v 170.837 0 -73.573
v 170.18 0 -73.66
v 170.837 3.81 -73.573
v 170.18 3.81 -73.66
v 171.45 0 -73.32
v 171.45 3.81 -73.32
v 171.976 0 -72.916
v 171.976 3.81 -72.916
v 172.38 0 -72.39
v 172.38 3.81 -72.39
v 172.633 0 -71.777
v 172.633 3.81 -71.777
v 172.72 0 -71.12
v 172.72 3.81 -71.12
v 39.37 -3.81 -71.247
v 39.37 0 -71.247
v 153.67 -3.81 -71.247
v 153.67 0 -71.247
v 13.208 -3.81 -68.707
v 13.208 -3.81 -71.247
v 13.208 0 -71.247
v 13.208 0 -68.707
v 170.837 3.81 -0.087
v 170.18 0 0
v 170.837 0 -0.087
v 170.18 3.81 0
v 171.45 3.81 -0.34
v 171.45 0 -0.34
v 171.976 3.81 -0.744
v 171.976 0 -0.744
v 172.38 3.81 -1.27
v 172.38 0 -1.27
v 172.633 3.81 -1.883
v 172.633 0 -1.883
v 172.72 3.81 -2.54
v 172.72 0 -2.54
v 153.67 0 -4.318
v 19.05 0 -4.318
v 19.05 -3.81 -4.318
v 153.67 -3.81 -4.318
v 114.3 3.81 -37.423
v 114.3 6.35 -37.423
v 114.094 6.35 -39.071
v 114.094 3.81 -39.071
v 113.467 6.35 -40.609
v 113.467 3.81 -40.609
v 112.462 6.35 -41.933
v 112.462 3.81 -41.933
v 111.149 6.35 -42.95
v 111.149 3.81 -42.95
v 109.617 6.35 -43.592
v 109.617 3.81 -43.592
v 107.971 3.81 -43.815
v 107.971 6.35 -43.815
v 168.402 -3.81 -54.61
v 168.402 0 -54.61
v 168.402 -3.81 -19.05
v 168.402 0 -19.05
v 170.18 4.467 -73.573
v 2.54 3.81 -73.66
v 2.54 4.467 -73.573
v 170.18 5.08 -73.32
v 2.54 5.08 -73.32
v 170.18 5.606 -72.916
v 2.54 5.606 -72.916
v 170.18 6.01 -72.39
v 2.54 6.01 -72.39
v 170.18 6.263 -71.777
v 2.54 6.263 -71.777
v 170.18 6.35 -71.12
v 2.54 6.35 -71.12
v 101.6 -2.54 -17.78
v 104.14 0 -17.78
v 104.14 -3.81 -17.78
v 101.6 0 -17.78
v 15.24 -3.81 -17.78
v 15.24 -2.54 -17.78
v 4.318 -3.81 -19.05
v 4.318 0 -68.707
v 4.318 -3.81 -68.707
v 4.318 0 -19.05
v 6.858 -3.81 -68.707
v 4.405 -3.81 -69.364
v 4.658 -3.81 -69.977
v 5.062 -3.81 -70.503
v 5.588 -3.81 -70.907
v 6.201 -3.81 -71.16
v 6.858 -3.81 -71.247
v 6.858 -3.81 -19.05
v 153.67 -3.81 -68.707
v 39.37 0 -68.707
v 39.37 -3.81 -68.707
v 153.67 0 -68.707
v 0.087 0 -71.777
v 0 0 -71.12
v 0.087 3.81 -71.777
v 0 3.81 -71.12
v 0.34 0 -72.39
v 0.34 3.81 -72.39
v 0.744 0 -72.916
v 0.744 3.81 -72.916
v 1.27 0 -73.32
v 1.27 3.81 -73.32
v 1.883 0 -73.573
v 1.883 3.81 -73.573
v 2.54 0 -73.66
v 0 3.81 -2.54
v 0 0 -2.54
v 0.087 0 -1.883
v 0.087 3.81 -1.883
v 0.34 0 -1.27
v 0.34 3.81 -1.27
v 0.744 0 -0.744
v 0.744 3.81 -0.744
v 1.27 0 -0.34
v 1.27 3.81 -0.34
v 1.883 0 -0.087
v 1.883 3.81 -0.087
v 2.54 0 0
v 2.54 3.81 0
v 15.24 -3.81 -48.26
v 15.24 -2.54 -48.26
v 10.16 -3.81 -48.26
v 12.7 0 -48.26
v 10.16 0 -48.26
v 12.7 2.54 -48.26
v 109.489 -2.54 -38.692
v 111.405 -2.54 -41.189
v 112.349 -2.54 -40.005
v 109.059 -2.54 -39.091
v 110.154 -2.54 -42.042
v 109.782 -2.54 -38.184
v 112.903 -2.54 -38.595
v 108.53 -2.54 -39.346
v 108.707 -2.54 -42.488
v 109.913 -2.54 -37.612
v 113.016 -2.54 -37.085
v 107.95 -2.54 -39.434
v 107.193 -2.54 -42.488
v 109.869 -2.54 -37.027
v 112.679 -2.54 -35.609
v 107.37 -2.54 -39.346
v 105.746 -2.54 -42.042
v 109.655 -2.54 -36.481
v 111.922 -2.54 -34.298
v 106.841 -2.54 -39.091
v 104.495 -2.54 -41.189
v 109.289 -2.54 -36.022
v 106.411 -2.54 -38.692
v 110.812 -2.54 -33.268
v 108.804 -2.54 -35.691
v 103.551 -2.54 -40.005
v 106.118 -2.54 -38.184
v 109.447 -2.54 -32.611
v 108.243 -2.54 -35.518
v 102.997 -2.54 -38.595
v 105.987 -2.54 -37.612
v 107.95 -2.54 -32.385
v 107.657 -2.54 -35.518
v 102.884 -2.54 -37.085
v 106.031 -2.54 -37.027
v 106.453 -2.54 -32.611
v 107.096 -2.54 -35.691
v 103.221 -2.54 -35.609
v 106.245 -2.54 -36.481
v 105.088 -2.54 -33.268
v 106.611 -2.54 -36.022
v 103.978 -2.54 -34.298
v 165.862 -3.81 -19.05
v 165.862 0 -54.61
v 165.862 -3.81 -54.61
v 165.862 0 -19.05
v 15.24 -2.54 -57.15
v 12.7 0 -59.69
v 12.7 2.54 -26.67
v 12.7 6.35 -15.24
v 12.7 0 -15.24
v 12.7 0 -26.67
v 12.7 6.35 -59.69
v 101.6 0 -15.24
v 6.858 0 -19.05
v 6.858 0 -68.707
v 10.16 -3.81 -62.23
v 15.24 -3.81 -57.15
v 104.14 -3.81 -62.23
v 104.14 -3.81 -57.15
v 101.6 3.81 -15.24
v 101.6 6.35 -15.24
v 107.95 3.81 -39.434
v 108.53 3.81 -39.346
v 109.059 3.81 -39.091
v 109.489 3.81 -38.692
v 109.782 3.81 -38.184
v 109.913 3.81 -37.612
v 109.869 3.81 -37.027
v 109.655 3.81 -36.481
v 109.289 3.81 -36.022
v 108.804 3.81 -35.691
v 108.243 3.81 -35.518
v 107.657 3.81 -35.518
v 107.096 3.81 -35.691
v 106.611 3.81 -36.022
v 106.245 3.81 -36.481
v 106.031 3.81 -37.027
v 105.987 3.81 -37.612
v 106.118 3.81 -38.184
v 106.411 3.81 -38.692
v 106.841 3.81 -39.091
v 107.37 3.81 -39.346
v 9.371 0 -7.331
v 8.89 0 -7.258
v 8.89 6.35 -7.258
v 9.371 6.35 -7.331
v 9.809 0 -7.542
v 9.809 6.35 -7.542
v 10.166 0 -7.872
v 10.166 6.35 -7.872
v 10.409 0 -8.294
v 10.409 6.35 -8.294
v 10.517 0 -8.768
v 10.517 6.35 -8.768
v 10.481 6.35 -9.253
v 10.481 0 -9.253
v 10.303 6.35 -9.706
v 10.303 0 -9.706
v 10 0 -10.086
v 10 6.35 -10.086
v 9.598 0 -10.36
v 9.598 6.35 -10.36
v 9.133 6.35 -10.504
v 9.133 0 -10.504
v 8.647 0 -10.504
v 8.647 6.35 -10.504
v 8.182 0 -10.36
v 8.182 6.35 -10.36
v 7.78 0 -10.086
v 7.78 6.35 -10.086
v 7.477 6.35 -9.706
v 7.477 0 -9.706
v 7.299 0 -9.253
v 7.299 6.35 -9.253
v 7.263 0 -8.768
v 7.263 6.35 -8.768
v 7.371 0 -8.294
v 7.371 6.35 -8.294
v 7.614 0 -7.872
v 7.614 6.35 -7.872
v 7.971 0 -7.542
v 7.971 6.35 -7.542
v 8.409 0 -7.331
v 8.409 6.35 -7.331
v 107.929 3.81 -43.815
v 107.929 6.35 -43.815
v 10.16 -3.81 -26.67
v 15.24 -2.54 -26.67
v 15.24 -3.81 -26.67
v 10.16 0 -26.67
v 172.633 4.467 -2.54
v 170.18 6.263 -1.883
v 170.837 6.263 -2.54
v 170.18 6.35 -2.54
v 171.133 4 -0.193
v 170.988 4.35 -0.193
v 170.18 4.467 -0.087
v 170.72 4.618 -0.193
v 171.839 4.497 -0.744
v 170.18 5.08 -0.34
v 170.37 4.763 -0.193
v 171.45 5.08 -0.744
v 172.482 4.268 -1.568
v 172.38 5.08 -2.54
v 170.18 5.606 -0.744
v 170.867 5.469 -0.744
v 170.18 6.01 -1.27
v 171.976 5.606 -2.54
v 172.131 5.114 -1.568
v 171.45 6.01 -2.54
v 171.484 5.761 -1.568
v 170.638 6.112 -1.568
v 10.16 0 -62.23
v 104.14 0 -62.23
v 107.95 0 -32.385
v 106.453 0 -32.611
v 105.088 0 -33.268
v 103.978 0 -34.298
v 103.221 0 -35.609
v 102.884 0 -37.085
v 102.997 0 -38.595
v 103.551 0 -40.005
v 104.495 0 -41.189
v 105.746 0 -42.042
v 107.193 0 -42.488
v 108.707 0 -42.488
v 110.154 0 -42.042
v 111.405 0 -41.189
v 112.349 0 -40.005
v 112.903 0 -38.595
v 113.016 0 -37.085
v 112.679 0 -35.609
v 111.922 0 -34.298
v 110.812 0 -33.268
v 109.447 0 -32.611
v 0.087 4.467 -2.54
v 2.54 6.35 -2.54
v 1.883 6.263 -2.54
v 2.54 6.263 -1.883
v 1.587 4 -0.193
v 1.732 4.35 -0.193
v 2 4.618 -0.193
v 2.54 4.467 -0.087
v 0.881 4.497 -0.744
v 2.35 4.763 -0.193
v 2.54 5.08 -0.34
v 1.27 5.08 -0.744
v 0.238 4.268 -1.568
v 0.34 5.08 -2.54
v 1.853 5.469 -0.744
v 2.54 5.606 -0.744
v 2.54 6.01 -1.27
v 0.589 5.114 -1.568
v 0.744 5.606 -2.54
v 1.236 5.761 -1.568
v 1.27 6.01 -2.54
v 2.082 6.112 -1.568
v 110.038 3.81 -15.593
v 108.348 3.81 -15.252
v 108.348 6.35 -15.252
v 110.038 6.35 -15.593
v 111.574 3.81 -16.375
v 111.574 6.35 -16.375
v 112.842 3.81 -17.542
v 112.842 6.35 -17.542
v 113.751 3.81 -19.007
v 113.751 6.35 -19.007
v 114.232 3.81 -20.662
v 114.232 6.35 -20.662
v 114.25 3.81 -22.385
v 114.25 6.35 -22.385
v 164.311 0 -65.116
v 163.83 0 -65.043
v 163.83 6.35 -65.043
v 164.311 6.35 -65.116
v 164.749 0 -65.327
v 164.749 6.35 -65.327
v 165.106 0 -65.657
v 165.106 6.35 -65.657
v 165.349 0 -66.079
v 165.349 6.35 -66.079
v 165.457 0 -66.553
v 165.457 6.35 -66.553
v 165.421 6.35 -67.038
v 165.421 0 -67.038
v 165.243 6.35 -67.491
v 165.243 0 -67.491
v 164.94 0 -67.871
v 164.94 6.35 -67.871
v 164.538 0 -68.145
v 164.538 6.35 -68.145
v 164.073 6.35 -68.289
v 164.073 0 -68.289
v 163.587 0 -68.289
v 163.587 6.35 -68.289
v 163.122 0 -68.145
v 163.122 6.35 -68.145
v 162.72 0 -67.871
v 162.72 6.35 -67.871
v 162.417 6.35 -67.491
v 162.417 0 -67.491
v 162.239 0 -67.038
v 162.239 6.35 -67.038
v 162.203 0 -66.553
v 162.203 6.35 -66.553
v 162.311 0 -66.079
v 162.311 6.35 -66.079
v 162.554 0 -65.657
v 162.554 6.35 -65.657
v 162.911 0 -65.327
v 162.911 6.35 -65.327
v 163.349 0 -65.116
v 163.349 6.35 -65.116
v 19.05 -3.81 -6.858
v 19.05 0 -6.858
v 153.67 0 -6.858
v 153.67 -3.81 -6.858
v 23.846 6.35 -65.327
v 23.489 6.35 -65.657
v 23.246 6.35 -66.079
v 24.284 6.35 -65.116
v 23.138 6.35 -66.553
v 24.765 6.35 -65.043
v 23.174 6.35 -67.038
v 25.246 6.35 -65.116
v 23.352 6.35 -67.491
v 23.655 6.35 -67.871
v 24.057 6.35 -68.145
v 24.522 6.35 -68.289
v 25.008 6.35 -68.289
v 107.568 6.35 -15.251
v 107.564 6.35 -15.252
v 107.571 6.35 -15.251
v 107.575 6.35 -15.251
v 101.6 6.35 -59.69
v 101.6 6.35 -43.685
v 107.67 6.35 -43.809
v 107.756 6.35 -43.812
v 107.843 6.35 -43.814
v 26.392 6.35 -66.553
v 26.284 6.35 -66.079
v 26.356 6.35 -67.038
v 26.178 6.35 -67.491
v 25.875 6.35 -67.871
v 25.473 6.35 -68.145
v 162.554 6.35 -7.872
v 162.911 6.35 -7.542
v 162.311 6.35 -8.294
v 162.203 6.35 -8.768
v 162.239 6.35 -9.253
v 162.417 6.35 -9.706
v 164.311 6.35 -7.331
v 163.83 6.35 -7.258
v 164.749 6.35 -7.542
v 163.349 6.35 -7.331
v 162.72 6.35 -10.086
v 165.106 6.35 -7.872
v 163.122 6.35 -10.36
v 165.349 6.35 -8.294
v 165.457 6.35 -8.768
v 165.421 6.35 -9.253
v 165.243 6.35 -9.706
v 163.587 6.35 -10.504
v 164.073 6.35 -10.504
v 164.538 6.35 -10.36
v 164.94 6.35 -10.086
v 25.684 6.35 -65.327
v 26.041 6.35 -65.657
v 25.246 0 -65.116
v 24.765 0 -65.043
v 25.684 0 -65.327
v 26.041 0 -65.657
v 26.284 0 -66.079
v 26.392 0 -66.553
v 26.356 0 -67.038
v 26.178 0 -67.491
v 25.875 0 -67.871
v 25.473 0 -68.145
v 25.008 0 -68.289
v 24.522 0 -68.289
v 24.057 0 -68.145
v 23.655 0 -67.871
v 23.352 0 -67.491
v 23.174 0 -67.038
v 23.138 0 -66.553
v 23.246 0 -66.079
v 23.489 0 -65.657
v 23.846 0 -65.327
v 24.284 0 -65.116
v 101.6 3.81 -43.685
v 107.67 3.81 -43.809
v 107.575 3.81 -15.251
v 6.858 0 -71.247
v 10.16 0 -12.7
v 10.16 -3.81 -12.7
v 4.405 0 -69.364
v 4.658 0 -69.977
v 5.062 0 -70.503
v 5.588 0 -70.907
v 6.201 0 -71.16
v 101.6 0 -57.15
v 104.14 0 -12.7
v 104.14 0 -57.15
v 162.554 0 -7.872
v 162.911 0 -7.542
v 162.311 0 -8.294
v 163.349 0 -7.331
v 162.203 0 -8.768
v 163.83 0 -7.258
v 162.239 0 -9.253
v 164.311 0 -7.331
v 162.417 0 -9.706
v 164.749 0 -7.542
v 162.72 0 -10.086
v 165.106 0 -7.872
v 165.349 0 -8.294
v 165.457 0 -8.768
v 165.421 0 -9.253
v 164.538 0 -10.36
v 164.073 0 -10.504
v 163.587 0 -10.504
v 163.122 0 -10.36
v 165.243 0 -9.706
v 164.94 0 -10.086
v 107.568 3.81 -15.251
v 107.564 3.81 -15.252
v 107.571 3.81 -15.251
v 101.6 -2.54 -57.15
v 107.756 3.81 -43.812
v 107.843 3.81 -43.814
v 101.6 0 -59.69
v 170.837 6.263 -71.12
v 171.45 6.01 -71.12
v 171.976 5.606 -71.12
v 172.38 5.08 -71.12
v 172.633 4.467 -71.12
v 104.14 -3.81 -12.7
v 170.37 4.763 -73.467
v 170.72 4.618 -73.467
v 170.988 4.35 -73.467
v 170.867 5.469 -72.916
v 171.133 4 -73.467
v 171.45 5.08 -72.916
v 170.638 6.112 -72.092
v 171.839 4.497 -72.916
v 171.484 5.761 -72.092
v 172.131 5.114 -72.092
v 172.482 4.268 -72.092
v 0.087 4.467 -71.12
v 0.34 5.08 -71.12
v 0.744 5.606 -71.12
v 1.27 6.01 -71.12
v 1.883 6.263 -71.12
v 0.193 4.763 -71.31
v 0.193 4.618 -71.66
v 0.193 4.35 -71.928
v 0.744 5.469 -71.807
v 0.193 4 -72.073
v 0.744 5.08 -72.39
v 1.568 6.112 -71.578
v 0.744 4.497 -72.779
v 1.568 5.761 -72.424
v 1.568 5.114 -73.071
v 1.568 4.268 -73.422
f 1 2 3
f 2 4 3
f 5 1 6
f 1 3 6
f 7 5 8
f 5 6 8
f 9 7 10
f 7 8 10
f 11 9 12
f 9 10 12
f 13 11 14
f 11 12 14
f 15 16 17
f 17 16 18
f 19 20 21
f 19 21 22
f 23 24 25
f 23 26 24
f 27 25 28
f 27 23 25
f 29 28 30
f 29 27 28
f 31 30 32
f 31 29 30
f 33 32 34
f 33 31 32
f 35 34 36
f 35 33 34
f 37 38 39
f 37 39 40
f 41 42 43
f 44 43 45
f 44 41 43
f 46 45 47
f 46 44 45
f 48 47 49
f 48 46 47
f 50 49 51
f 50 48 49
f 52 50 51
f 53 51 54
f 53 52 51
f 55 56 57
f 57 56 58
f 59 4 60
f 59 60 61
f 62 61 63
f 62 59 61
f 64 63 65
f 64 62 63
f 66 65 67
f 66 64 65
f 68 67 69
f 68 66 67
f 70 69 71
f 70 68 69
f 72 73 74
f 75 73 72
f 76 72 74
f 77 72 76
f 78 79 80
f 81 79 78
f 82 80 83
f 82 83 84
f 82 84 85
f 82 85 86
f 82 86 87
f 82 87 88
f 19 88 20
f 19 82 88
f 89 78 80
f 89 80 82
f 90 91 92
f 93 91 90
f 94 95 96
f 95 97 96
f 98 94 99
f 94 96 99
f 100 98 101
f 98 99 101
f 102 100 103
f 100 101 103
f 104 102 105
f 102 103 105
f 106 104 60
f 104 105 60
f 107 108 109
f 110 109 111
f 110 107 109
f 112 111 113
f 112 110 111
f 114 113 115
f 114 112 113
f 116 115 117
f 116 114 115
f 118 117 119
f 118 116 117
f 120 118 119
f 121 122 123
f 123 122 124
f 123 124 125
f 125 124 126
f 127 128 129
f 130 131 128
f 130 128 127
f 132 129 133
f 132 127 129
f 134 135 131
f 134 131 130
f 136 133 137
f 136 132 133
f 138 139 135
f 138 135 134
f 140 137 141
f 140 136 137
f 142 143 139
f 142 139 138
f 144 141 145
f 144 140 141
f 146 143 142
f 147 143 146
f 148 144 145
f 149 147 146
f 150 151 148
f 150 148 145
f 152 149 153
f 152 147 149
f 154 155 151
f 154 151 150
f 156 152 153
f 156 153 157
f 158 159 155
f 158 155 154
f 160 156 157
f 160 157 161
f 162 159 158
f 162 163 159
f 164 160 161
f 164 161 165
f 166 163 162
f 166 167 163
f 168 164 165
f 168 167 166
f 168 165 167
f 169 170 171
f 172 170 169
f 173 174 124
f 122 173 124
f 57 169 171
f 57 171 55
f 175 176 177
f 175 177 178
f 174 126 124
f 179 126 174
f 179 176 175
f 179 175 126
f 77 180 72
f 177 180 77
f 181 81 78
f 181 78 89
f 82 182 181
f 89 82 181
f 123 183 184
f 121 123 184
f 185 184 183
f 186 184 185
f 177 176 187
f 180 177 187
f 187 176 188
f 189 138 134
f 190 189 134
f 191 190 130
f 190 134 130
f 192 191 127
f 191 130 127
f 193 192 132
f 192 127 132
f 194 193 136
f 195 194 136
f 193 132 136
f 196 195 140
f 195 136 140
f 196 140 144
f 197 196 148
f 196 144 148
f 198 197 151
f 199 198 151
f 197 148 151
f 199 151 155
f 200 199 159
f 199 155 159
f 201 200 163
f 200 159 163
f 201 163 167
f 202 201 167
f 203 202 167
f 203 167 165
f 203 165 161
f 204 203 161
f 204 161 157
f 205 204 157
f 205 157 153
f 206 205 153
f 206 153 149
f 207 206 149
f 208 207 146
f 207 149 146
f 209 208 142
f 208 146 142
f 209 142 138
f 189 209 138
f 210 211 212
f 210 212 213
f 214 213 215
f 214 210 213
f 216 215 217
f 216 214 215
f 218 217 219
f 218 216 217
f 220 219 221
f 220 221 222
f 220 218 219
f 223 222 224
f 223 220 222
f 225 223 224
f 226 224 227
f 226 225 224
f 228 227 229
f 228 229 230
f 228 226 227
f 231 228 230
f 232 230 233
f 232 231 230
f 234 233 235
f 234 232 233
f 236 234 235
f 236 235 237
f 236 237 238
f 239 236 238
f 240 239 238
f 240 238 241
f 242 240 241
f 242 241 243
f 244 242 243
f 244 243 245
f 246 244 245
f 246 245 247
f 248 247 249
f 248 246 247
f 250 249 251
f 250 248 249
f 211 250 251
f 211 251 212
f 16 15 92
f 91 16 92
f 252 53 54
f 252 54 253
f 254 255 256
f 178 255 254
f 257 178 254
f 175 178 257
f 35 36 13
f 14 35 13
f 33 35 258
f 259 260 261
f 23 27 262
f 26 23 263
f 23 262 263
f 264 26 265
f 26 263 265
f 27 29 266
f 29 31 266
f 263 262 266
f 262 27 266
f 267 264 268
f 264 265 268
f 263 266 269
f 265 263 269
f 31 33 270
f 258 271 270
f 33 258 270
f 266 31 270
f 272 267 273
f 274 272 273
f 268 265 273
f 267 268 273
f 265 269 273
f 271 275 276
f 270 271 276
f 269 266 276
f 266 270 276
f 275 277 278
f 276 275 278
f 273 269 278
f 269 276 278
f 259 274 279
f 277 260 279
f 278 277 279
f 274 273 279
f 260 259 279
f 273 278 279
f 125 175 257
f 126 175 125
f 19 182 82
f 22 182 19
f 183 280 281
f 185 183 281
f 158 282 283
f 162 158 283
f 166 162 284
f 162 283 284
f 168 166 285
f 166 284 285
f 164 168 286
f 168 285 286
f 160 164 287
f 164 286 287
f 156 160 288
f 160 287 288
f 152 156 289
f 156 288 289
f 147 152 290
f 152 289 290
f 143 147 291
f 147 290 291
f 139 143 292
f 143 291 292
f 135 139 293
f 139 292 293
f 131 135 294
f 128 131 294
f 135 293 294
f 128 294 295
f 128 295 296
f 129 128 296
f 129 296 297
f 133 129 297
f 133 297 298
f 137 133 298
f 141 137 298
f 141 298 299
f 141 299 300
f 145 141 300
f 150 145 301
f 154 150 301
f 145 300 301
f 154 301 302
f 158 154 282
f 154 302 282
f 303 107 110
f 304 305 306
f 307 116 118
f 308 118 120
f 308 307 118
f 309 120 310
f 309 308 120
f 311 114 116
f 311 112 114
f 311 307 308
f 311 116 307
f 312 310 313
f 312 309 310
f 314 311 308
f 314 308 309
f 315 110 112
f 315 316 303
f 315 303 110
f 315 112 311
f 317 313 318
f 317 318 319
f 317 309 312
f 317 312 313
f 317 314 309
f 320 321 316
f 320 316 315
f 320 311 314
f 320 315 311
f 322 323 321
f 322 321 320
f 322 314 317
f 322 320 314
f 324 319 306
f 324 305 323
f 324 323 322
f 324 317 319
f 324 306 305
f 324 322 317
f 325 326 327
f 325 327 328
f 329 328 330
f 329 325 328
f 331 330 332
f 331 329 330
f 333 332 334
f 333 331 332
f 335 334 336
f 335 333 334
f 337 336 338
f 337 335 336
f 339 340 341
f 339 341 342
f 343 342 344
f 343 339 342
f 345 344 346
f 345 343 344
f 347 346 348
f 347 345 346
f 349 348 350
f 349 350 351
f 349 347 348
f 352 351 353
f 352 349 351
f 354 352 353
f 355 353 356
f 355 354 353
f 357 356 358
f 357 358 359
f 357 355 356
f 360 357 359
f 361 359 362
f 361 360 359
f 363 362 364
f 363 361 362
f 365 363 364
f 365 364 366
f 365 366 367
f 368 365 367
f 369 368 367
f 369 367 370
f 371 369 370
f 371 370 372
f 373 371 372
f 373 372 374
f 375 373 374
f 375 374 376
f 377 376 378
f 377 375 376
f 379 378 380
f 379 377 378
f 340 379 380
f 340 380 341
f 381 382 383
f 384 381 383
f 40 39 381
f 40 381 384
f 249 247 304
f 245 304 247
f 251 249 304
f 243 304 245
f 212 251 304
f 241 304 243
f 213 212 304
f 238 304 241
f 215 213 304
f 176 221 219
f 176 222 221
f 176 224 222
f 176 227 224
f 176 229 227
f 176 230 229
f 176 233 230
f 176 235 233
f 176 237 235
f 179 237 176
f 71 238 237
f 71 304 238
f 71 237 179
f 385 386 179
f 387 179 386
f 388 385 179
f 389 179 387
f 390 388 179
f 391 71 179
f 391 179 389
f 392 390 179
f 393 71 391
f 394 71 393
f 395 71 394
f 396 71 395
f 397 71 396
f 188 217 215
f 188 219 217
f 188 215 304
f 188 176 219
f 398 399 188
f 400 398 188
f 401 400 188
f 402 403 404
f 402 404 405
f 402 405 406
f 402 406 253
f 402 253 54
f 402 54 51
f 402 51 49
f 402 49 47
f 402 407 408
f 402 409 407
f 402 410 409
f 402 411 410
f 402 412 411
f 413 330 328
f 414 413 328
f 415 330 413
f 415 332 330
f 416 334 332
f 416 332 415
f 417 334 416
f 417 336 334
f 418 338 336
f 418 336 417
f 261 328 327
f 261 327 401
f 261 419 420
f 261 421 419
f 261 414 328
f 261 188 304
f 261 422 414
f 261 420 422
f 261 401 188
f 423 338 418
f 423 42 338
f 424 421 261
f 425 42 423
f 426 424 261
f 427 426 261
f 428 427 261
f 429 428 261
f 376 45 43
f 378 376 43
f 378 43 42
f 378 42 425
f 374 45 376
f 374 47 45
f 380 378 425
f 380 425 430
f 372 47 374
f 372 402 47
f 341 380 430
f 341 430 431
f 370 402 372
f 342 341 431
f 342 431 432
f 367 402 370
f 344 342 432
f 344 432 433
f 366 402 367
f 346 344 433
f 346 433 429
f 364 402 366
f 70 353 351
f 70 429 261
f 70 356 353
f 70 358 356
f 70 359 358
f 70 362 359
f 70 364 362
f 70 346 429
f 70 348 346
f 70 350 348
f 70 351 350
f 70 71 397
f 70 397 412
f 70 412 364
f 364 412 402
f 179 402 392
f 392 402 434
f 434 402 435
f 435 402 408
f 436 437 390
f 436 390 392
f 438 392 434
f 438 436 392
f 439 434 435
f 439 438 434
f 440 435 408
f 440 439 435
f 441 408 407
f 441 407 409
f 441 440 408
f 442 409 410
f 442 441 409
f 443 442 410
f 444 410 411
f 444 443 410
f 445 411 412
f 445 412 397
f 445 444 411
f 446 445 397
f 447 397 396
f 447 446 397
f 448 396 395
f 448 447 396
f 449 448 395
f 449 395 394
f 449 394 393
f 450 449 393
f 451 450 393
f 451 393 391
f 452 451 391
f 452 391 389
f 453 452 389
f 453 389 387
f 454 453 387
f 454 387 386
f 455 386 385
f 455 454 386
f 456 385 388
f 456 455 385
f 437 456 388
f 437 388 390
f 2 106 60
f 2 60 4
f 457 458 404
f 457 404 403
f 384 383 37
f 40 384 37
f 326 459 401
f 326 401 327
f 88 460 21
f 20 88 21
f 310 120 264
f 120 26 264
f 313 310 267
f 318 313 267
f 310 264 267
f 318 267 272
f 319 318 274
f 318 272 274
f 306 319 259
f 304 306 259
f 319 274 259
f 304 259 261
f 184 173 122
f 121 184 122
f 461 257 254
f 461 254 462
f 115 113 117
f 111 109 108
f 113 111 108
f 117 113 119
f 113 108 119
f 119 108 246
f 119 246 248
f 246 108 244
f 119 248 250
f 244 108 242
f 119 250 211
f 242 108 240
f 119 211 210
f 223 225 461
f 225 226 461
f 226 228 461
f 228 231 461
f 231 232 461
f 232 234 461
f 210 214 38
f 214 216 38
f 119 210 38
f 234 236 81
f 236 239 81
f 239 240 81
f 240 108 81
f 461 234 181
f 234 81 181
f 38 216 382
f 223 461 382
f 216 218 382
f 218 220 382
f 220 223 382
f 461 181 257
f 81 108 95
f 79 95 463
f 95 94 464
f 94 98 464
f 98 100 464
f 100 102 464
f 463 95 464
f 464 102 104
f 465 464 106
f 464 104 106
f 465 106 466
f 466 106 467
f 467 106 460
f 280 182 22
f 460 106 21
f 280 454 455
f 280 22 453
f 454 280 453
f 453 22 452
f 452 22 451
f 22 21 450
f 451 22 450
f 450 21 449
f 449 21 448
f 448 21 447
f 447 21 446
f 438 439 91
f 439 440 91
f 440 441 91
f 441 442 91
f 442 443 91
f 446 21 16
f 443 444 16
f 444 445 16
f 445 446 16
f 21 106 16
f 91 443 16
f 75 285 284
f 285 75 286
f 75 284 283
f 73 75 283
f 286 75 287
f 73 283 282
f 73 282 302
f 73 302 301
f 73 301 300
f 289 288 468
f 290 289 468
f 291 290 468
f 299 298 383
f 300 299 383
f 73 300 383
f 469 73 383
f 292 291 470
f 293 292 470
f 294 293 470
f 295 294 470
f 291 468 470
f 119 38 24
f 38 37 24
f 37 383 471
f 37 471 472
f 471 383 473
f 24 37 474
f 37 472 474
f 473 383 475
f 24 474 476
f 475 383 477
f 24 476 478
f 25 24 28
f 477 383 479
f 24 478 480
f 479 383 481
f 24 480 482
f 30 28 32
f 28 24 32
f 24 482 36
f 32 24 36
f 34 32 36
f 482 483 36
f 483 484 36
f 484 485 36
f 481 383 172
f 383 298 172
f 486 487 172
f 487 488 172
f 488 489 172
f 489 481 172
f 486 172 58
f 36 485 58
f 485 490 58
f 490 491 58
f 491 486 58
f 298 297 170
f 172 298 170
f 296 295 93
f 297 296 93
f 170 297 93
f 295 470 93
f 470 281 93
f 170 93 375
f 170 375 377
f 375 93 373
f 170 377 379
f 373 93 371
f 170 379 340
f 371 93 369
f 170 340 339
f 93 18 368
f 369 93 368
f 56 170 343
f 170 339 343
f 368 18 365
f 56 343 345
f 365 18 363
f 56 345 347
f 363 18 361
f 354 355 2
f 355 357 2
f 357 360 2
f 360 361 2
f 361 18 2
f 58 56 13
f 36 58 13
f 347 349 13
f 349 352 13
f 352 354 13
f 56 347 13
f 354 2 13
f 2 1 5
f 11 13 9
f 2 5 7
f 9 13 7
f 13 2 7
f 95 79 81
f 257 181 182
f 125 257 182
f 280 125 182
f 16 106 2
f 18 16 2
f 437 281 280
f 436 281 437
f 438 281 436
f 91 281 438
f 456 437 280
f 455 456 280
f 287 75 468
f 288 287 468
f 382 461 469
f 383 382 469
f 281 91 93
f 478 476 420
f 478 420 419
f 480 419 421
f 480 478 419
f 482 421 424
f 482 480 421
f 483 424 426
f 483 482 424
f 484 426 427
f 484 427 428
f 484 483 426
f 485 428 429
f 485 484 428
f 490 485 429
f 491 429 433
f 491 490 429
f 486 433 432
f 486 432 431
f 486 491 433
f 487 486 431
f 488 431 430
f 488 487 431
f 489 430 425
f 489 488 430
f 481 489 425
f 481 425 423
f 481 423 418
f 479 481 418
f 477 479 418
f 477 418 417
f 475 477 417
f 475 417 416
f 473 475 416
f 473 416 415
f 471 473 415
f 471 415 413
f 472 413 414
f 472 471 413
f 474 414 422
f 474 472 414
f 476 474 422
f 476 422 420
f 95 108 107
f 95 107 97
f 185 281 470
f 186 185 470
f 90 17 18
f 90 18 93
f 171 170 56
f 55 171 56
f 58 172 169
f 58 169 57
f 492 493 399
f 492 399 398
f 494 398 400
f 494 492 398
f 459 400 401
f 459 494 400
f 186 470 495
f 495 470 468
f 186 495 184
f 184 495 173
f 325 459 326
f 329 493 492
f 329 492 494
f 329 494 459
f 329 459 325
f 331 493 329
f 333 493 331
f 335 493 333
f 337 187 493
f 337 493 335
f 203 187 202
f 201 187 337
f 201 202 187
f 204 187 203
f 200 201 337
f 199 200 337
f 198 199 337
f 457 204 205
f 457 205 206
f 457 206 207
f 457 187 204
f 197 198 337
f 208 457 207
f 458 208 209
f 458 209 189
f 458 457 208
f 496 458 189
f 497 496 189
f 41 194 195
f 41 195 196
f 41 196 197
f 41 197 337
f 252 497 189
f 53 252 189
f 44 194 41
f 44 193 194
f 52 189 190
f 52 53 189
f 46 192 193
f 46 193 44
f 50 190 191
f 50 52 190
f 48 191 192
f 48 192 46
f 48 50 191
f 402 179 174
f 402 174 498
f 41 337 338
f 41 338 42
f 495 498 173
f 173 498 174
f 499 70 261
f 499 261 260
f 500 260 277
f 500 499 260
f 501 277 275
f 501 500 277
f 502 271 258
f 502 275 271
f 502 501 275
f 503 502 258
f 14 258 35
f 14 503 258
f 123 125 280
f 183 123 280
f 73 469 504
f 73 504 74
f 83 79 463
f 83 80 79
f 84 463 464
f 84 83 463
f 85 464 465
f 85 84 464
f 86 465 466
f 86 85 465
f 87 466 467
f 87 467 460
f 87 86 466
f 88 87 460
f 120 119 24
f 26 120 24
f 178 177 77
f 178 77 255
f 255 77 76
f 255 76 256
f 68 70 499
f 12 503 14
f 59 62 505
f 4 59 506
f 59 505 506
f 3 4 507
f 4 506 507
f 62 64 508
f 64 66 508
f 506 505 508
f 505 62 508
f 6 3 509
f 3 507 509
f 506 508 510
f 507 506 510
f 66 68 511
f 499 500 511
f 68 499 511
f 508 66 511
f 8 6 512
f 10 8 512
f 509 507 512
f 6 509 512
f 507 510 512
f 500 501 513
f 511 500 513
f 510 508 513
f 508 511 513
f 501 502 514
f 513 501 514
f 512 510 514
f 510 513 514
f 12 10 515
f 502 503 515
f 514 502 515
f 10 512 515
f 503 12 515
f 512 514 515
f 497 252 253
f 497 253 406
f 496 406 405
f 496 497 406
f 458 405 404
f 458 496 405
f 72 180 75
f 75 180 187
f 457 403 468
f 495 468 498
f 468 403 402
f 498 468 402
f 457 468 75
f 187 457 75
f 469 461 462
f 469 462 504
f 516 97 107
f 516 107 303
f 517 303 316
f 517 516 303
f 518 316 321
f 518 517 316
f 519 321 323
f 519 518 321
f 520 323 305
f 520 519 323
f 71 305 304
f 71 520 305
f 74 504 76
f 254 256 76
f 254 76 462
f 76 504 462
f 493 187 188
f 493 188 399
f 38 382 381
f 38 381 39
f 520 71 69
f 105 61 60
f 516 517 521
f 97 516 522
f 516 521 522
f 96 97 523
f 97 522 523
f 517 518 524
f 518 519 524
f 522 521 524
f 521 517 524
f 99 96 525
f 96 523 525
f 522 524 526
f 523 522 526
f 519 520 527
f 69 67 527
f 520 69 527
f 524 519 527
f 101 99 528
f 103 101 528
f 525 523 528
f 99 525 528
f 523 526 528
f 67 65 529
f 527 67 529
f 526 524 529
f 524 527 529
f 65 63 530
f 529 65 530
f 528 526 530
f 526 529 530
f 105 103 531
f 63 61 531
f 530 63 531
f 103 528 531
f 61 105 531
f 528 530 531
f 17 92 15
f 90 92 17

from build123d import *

# Parameters (mm, degrees)
SKETCH1_W               = 172.72
SKETCH1_H               = 73.66
SKETCH1_R               = 1.63195
BOSS_EXTRUDE1_DEPTH     = 6.35
SKETCH2_W               = 88.9
SKETCH2_H               = 44.45
CUT_EXTRUDE1_DEPTH      = 6.35
FILLET1_R               = 2.54
BOSS_EXTRUDE2_DEPTH     = 3.81
CHAMFER1_SIZE           = 2.54
CHAMFER2_SIZE           = 2.54
CUT_EXTRUDE3_DEPTH      = 189.045791232
CUT_EXTRUDE3_DEPTH_BACK = 2.54
CUT_EXTRUDE4_DEPTH      = 189.045791232
CUT_EXTRUDE4_DEPTH_BACK = 2.54
SKETCH8_R               = 5.08
BOSS_EXTRUDE3_DEPTH     = 2.54
SKETCH9_R               = 1.9685
CUT_EXTRUDE5_DEPTH      = 6.35
SKETCH10_W              = 134.62
SKETCH10_H              = 2.54
SKETCH10_W_2            = 114.3
SKETCH10_W_3            = 2.54
SKETCH10_H_2            = 35.56
SKETCH10_H_3            = 52.197
SKETCH10_W_4            = 6.35
BOSS_EXTRUDE4_DEPTH     = 3.81
FILLET2_R               = 2.54


with BuildPart() as part:
    # Sketch1 → Boss-Extrude1 (new body)
    with BuildSketch(Plane(origin=(0, 0, 0), x_dir=(1, 0, 0), z_dir=(0, 1, 0))):
        with Locations((86.36, 36.83)):
            Rectangle(SKETCH1_W, SKETCH1_H)
        with Locations(Location((24.765, 66.675, 0), (0, 0, 270))):
            Circle(SKETCH1_R, mode=Mode.SUBTRACT)
        with Locations(Location((8.89, 8.89, 0), (0, 0, 270))):
            Circle(SKETCH1_R, mode=Mode.SUBTRACT)
        with Locations(Location((163.83, 66.675, 0), (0, 0, 270))):
            Circle(SKETCH1_R, mode=Mode.SUBTRACT)
        with Locations(Location((163.83, 8.89, 0), (0, 0, 270))):
            Circle(SKETCH1_R, mode=Mode.SUBTRACT)
    extrude(amount=BOSS_EXTRUDE1_DEPTH)

    # Sketch2 → Cut-Extrude1 (cut)
    with BuildSketch(Plane(origin=(0, 6.35, 0), x_dir=(1, 0, 0), z_dir=(0, 1, 0))):
        with Locations((57.15, 37.465)):
            Rectangle(SKETCH2_W, SKETCH2_H)
    extrude(amount=-CUT_EXTRUDE1_DEPTH, mode=Mode.SUBTRACT)

    # Fillet1
    fillet1_edges = [part.edges().sort_by_distance(p)[0] for p in [
        (172.72, 6.35, -36.83),
        (86.36, 6.35, -73.66),
        (0, 6.35, -36.83),
        (0, 3.175, -73.66),
        (172.72, 3.175, -73.66),
        (172.72, 3.175, 0),
        (0, 3.175, 0),
        (86.36, 6.35, 0),
    ]]
    fillet(fillet1_edges, radius=FILLET1_R)

    # Sketch3 → Boss-Extrude2 (add)
    with BuildSketch(Plane.XZ):
        Polygon((10.16, -12.7), (104.14, -12.7), (104.14, -17.78), (15.24, -17.78), (15.24, -26.67), (10.16, -26.67), align=None)
        Polygon((10.16, -62.23), (104.14, -62.23), (104.14, -57.15), (15.24, -57.15), (15.24, -48.26), (10.16, -48.26), align=None)
    extrude(amount=BOSS_EXTRUDE2_DEPTH)

    # Chamfer1
    chamfer1_edges = [part.edges().sort_by_distance(p)[0] for p in [
        (12.7, 0, -37.465),
    ]]
    chamfer(chamfer1_edges, length=CHAMFER1_SIZE)

    # Chamfer2
    chamfer2_edges = [part.edges().sort_by_distance(p)[0] for p in [
        (58.42, 0, -17.78),
        (15.24, 0, -22.225),
        (15.24, 0, -52.705),
        (58.42, 0, -57.15),
    ]]
    chamfer(chamfer2_edges, length=CHAMFER2_SIZE - 0.0001)  # a hair under: the kernel refuses the full size

    # Sketch6 → Cut-Extrude3 (cut, two sides: drawn at the far end of the back side and taken through both)
    with BuildSketch(Plane(origin=(0, 6.35, 0), x_dir=(1, 0, 0), z_dir=(0, 1, 0)).offset(-CUT_EXTRUDE3_DEPTH_BACK)):
        with BuildLine():
            ThreePointArc((114.299859558, 37.422767419), (112.462469481, 41.932674919), (107.971116407, 43.814964889))
            Line((107.971116407, 43.814964889), (107.928883593, 43.814964889))
            ThreePointArc((107.928883593, 43.814964889), (103.452412358, 41.947656066), (101.6, 37.465))
            Line((101.6, 37.465), (101.6, 21.589866304))
            ThreePointArc((101.6, 21.589866304), (103.329230599, 17.234296291), (107.575115004, 15.250942007))
            Line((107.575115004, 15.250942007), (108.348372102, 15.252374712))
            ThreePointArc((108.348372102, 15.252374712), (112.842425973, 17.541821331), (114.250015644, 22.385041059))
            Line((114.250015644, 22.385041059), (114.299859558, 37.422767419))
        make_face()
    extrude(amount=CUT_EXTRUDE3_DEPTH + CUT_EXTRUDE3_DEPTH_BACK, mode=Mode.SUBTRACT)

    # Sketch7 → Cut-Extrude4 (cut, two sides: drawn at the far end of the back side and taken through both)
    with BuildSketch(Plane(origin=(0, 6.35, 0), x_dir=(1, 0, 0), z_dir=(0, 1, 0)).offset(-CUT_EXTRUDE4_DEPTH_BACK)):
        with BuildLine():
            Line((101.6, 43.68515436), (101.6, 37.465))
            ThreePointArc((101.6, 37.465), (103.362031135, 41.855107253), (107.670249351, 43.808834769))
            Line((107.670249351, 43.808834769), (101.6, 43.68515436))
        make_face()
        with BuildLine():
            ThreePointArc((107.563787548, 15.251622072), (103.325340603, 17.238426833), (101.6, 21.589866304))
            Line((101.6, 21.589866304), (101.6, 15.24))
            Line((101.6, 15.24), (107.563787548, 15.251622072))
        make_face()
    extrude(amount=CUT_EXTRUDE4_DEPTH + CUT_EXTRUDE4_DEPTH_BACK, mode=Mode.SUBTRACT)

    # Sketch8 → Boss-Extrude3 (add)
    with BuildSketch(Plane.XZ):
        with Locations(Location((107.95, -37.465, 0), (0, 0, 90))):
            Circle(SKETCH8_R)
    extrude(amount=BOSS_EXTRUDE3_DEPTH)

    # Sketch9 → Cut-Extrude5 (cut)
    with BuildSketch(Plane.XZ.offset(2.54)):
        with Locations(Location((107.95, -37.465, 0), (0, 0, 270))):
            Circle(SKETCH9_R)
    extrude(amount=-CUT_EXTRUDE5_DEPTH, mode=Mode.SUBTRACT)

    # Sketch10 → Boss-Extrude4 (add)
    with BuildSketch(Plane.XZ):
        with Locations((86.36, -5.588)):
            Rectangle(SKETCH10_W, SKETCH10_H)
        with Locations((96.52, -69.977)):
            Rectangle(SKETCH10_W_2, SKETCH10_H)
        with Locations((167.132, -36.83)):
            Rectangle(SKETCH10_W_3, SKETCH10_H_2)
        with Locations((5.588, -45.1485)):
            Rectangle(SKETCH10_W_3, SKETCH10_H_3)
        with Locations((10.033, -69.977)):
            Rectangle(SKETCH10_W_4, SKETCH10_H)
    extrude(amount=BOSS_EXTRUDE4_DEPTH)

    # Fillet2
    fillet2_edges = [part.edges().sort_by_distance(p)[0] for p in [
        (4.318, -1.905, -71.247),
    ]]
    fillet(fillet2_edges, radius=FILLET2_R)


solid = part.part
